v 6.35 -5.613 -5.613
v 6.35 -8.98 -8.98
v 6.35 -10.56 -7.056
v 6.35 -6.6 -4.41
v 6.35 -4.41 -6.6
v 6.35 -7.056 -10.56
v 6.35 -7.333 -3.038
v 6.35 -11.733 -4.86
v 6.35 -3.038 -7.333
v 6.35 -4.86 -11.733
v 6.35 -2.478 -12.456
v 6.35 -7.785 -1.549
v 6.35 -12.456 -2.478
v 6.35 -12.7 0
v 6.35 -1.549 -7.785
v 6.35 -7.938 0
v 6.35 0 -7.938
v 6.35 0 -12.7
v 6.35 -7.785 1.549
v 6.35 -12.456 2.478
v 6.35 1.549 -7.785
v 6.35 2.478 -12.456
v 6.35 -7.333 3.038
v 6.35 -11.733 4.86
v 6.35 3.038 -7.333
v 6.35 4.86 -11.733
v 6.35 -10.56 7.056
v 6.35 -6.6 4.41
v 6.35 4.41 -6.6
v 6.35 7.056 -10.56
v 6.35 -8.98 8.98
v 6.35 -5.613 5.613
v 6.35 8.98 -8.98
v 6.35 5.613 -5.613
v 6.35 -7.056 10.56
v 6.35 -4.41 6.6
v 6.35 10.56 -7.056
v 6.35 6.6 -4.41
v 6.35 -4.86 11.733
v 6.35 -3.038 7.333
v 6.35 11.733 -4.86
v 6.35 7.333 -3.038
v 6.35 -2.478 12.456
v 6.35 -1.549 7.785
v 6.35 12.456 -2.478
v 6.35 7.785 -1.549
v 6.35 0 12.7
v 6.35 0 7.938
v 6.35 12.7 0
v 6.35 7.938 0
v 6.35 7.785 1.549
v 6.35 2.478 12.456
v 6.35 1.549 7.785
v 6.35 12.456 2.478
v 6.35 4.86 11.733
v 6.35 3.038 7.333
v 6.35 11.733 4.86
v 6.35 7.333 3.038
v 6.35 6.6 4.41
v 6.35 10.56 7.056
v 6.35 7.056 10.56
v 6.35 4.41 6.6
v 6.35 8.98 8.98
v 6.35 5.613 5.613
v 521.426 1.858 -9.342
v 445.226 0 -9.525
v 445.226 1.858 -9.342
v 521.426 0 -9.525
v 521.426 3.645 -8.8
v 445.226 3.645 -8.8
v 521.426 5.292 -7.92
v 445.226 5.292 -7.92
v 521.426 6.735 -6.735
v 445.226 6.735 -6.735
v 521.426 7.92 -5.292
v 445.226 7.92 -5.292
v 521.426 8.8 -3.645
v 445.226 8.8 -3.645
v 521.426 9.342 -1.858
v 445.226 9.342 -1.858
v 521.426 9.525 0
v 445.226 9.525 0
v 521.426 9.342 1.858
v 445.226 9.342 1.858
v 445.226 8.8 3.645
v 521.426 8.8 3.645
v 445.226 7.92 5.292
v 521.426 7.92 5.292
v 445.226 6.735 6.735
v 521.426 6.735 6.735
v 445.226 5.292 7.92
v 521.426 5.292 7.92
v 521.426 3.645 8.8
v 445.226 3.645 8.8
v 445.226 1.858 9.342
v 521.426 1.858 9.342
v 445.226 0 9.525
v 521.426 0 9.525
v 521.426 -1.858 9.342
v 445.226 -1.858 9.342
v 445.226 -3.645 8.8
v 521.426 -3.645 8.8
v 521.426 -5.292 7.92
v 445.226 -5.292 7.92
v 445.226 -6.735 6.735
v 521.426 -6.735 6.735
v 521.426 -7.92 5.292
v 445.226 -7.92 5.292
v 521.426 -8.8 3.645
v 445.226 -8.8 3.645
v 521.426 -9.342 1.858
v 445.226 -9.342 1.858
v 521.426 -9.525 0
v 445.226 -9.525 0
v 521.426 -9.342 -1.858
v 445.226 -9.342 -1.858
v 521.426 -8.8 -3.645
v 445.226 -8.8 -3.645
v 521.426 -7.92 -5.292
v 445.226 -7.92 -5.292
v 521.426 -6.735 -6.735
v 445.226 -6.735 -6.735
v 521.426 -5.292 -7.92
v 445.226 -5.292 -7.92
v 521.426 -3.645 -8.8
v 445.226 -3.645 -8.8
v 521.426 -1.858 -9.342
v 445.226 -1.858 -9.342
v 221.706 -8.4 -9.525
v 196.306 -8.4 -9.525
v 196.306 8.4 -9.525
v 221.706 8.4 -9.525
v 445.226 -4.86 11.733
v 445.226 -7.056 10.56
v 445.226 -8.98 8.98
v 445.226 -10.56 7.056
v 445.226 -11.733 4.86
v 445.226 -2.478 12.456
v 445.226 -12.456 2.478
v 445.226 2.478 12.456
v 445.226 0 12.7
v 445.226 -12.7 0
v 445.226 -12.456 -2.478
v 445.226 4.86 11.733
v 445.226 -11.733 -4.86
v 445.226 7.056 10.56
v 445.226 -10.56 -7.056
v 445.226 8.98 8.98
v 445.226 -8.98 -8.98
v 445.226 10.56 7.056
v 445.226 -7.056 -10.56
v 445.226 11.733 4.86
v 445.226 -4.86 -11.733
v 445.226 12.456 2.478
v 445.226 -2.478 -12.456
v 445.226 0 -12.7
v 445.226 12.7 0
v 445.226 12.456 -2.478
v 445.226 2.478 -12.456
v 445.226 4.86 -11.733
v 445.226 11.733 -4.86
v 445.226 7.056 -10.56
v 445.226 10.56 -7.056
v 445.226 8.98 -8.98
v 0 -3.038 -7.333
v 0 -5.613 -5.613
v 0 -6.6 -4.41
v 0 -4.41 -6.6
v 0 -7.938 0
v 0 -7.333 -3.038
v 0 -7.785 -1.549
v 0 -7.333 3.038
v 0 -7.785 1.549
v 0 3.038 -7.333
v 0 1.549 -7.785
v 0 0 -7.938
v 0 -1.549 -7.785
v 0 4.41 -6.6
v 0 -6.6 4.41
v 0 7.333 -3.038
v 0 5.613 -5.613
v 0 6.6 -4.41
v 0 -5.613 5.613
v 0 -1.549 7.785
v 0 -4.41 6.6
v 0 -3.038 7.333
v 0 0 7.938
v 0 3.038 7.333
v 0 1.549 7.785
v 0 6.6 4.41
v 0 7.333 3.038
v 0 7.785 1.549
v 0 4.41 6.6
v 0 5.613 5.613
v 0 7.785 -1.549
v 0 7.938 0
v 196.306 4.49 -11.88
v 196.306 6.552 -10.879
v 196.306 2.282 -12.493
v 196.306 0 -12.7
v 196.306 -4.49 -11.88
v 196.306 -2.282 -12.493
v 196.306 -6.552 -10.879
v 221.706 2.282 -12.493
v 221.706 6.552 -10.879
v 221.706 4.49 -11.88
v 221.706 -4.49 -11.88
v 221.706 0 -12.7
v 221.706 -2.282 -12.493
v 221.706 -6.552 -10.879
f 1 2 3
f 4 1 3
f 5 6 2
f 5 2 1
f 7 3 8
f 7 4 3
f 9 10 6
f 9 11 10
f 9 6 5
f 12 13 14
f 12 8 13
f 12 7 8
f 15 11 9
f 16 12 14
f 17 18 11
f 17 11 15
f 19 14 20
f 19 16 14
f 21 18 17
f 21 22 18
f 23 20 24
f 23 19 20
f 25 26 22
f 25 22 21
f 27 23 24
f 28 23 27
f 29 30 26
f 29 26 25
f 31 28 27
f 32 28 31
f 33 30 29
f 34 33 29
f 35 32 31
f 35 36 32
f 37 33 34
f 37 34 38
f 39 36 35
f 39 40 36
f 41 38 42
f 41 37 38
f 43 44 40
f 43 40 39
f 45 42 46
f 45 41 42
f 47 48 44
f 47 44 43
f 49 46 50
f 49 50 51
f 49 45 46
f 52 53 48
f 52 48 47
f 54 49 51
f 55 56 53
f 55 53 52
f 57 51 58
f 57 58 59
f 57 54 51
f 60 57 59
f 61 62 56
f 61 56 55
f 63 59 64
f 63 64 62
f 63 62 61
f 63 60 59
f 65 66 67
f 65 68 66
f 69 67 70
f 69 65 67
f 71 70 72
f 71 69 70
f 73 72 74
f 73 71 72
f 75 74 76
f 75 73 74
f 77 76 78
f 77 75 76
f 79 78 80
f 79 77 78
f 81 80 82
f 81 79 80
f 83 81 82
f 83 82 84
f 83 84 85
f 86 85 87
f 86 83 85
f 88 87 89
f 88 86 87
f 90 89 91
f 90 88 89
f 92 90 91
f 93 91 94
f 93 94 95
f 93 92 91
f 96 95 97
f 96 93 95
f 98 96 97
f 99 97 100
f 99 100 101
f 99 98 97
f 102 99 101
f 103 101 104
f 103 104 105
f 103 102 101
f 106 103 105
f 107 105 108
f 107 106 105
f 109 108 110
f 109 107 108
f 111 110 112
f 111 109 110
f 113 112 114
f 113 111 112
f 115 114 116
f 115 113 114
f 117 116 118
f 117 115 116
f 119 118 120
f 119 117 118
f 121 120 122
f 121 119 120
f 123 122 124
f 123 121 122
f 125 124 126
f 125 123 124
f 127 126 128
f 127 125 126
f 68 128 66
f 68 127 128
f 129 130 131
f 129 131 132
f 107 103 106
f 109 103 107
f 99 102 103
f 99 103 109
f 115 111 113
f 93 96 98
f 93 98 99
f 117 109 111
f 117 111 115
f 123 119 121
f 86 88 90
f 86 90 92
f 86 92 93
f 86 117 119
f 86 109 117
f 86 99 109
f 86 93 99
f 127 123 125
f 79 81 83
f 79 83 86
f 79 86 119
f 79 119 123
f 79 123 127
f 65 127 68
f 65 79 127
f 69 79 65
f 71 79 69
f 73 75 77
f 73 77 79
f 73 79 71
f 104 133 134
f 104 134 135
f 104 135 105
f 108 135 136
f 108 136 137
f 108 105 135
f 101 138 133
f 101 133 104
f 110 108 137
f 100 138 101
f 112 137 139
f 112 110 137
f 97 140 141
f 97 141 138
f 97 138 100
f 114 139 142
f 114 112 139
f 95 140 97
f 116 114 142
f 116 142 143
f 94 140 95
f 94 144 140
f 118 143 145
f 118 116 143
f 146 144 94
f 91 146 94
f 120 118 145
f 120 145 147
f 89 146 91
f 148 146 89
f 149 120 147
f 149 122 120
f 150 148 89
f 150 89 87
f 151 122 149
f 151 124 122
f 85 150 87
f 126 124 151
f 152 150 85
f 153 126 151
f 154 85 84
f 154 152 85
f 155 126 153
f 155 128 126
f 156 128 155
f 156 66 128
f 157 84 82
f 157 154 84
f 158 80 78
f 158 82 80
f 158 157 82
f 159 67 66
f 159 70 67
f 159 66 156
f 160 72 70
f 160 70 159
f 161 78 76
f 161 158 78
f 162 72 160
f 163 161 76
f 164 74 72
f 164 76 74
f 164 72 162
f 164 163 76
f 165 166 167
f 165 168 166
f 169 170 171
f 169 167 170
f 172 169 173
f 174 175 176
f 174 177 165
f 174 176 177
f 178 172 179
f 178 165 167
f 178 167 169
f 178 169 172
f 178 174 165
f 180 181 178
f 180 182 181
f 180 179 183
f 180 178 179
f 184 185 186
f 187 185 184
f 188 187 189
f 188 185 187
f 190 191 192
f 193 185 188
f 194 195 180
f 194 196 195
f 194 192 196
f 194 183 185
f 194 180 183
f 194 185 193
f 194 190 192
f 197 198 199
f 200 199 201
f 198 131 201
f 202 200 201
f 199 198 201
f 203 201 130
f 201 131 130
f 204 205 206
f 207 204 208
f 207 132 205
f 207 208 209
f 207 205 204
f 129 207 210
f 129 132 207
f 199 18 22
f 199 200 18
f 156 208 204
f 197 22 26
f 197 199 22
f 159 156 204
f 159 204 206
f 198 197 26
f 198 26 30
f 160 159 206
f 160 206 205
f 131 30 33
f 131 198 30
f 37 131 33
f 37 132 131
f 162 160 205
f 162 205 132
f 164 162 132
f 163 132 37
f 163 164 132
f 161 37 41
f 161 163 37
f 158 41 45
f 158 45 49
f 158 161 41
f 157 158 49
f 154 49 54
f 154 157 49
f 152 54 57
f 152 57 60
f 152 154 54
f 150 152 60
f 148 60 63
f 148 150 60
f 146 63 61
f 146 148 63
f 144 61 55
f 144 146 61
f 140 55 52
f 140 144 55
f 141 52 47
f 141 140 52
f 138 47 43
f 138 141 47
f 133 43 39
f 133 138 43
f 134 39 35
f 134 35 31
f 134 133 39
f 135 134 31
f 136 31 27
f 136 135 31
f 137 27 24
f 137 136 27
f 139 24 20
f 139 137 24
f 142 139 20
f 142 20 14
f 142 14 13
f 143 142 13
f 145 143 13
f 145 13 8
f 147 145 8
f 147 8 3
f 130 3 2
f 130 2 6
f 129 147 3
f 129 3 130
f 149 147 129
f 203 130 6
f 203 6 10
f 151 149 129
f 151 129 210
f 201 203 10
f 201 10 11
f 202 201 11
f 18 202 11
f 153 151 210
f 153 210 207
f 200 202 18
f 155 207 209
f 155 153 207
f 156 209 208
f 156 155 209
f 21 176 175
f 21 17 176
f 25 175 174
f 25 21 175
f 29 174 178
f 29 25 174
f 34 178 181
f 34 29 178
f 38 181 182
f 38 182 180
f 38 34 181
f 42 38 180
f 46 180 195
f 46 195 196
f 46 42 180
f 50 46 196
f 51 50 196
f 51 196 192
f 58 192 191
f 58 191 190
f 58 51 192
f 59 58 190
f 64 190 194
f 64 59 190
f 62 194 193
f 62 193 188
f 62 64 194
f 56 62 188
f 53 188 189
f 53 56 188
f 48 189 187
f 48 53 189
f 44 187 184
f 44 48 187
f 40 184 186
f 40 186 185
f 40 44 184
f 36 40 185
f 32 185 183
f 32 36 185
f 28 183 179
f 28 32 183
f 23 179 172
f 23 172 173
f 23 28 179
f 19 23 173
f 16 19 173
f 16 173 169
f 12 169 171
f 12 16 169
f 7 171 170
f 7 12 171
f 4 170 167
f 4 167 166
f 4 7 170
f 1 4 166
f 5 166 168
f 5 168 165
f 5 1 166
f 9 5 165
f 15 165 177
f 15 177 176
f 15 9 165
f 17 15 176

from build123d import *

# Parameters (mm, degrees)
SKETCH3_W               = 25.4
SKETCH3_H               = 3.175
CUT_EXTRUDE1_DEPTH      = 13.7
CUT_EXTRUDE1_DEPTH_BACK = 13.7


with BuildPart() as part:
    # Sketch2 → Revolve1 (revolve)
    with BuildSketch(Plane(origin=(0, 0, 0), x_dir=(1, 0, 0), z_dir=(0, 1, 0))):
        Polygon((6.35, 7.9375), (6.35, 12.7), (445.226359817, 12.7), (445.226359817, 9.525), (521.426359817, 9.525), (521.426359817, 0), (0, 0), (0, 7.9375), align=None)
    revolve(axis=Axis((0, 0, 0), (1, 0, 0)))

    # Sketch3 → Cut-Extrude1 (cut, two sides)
    with BuildSketch(Plane(origin=(0, 0, 0), x_dir=(1, 0, 0), z_dir=(0, 1, 0))) as cut_extrude1_sk:
        with Locations((209.006359817, 11.1125)):
            Rectangle(SKETCH3_W, SKETCH3_H)
    extrude(amount=CUT_EXTRUDE1_DEPTH, mode=Mode.SUBTRACT)
    extrude(cut_extrude1_sk.sketch, amount=-CUT_EXTRUDE1_DEPTH_BACK, mode=Mode.SUBTRACT)


solid = part.part
